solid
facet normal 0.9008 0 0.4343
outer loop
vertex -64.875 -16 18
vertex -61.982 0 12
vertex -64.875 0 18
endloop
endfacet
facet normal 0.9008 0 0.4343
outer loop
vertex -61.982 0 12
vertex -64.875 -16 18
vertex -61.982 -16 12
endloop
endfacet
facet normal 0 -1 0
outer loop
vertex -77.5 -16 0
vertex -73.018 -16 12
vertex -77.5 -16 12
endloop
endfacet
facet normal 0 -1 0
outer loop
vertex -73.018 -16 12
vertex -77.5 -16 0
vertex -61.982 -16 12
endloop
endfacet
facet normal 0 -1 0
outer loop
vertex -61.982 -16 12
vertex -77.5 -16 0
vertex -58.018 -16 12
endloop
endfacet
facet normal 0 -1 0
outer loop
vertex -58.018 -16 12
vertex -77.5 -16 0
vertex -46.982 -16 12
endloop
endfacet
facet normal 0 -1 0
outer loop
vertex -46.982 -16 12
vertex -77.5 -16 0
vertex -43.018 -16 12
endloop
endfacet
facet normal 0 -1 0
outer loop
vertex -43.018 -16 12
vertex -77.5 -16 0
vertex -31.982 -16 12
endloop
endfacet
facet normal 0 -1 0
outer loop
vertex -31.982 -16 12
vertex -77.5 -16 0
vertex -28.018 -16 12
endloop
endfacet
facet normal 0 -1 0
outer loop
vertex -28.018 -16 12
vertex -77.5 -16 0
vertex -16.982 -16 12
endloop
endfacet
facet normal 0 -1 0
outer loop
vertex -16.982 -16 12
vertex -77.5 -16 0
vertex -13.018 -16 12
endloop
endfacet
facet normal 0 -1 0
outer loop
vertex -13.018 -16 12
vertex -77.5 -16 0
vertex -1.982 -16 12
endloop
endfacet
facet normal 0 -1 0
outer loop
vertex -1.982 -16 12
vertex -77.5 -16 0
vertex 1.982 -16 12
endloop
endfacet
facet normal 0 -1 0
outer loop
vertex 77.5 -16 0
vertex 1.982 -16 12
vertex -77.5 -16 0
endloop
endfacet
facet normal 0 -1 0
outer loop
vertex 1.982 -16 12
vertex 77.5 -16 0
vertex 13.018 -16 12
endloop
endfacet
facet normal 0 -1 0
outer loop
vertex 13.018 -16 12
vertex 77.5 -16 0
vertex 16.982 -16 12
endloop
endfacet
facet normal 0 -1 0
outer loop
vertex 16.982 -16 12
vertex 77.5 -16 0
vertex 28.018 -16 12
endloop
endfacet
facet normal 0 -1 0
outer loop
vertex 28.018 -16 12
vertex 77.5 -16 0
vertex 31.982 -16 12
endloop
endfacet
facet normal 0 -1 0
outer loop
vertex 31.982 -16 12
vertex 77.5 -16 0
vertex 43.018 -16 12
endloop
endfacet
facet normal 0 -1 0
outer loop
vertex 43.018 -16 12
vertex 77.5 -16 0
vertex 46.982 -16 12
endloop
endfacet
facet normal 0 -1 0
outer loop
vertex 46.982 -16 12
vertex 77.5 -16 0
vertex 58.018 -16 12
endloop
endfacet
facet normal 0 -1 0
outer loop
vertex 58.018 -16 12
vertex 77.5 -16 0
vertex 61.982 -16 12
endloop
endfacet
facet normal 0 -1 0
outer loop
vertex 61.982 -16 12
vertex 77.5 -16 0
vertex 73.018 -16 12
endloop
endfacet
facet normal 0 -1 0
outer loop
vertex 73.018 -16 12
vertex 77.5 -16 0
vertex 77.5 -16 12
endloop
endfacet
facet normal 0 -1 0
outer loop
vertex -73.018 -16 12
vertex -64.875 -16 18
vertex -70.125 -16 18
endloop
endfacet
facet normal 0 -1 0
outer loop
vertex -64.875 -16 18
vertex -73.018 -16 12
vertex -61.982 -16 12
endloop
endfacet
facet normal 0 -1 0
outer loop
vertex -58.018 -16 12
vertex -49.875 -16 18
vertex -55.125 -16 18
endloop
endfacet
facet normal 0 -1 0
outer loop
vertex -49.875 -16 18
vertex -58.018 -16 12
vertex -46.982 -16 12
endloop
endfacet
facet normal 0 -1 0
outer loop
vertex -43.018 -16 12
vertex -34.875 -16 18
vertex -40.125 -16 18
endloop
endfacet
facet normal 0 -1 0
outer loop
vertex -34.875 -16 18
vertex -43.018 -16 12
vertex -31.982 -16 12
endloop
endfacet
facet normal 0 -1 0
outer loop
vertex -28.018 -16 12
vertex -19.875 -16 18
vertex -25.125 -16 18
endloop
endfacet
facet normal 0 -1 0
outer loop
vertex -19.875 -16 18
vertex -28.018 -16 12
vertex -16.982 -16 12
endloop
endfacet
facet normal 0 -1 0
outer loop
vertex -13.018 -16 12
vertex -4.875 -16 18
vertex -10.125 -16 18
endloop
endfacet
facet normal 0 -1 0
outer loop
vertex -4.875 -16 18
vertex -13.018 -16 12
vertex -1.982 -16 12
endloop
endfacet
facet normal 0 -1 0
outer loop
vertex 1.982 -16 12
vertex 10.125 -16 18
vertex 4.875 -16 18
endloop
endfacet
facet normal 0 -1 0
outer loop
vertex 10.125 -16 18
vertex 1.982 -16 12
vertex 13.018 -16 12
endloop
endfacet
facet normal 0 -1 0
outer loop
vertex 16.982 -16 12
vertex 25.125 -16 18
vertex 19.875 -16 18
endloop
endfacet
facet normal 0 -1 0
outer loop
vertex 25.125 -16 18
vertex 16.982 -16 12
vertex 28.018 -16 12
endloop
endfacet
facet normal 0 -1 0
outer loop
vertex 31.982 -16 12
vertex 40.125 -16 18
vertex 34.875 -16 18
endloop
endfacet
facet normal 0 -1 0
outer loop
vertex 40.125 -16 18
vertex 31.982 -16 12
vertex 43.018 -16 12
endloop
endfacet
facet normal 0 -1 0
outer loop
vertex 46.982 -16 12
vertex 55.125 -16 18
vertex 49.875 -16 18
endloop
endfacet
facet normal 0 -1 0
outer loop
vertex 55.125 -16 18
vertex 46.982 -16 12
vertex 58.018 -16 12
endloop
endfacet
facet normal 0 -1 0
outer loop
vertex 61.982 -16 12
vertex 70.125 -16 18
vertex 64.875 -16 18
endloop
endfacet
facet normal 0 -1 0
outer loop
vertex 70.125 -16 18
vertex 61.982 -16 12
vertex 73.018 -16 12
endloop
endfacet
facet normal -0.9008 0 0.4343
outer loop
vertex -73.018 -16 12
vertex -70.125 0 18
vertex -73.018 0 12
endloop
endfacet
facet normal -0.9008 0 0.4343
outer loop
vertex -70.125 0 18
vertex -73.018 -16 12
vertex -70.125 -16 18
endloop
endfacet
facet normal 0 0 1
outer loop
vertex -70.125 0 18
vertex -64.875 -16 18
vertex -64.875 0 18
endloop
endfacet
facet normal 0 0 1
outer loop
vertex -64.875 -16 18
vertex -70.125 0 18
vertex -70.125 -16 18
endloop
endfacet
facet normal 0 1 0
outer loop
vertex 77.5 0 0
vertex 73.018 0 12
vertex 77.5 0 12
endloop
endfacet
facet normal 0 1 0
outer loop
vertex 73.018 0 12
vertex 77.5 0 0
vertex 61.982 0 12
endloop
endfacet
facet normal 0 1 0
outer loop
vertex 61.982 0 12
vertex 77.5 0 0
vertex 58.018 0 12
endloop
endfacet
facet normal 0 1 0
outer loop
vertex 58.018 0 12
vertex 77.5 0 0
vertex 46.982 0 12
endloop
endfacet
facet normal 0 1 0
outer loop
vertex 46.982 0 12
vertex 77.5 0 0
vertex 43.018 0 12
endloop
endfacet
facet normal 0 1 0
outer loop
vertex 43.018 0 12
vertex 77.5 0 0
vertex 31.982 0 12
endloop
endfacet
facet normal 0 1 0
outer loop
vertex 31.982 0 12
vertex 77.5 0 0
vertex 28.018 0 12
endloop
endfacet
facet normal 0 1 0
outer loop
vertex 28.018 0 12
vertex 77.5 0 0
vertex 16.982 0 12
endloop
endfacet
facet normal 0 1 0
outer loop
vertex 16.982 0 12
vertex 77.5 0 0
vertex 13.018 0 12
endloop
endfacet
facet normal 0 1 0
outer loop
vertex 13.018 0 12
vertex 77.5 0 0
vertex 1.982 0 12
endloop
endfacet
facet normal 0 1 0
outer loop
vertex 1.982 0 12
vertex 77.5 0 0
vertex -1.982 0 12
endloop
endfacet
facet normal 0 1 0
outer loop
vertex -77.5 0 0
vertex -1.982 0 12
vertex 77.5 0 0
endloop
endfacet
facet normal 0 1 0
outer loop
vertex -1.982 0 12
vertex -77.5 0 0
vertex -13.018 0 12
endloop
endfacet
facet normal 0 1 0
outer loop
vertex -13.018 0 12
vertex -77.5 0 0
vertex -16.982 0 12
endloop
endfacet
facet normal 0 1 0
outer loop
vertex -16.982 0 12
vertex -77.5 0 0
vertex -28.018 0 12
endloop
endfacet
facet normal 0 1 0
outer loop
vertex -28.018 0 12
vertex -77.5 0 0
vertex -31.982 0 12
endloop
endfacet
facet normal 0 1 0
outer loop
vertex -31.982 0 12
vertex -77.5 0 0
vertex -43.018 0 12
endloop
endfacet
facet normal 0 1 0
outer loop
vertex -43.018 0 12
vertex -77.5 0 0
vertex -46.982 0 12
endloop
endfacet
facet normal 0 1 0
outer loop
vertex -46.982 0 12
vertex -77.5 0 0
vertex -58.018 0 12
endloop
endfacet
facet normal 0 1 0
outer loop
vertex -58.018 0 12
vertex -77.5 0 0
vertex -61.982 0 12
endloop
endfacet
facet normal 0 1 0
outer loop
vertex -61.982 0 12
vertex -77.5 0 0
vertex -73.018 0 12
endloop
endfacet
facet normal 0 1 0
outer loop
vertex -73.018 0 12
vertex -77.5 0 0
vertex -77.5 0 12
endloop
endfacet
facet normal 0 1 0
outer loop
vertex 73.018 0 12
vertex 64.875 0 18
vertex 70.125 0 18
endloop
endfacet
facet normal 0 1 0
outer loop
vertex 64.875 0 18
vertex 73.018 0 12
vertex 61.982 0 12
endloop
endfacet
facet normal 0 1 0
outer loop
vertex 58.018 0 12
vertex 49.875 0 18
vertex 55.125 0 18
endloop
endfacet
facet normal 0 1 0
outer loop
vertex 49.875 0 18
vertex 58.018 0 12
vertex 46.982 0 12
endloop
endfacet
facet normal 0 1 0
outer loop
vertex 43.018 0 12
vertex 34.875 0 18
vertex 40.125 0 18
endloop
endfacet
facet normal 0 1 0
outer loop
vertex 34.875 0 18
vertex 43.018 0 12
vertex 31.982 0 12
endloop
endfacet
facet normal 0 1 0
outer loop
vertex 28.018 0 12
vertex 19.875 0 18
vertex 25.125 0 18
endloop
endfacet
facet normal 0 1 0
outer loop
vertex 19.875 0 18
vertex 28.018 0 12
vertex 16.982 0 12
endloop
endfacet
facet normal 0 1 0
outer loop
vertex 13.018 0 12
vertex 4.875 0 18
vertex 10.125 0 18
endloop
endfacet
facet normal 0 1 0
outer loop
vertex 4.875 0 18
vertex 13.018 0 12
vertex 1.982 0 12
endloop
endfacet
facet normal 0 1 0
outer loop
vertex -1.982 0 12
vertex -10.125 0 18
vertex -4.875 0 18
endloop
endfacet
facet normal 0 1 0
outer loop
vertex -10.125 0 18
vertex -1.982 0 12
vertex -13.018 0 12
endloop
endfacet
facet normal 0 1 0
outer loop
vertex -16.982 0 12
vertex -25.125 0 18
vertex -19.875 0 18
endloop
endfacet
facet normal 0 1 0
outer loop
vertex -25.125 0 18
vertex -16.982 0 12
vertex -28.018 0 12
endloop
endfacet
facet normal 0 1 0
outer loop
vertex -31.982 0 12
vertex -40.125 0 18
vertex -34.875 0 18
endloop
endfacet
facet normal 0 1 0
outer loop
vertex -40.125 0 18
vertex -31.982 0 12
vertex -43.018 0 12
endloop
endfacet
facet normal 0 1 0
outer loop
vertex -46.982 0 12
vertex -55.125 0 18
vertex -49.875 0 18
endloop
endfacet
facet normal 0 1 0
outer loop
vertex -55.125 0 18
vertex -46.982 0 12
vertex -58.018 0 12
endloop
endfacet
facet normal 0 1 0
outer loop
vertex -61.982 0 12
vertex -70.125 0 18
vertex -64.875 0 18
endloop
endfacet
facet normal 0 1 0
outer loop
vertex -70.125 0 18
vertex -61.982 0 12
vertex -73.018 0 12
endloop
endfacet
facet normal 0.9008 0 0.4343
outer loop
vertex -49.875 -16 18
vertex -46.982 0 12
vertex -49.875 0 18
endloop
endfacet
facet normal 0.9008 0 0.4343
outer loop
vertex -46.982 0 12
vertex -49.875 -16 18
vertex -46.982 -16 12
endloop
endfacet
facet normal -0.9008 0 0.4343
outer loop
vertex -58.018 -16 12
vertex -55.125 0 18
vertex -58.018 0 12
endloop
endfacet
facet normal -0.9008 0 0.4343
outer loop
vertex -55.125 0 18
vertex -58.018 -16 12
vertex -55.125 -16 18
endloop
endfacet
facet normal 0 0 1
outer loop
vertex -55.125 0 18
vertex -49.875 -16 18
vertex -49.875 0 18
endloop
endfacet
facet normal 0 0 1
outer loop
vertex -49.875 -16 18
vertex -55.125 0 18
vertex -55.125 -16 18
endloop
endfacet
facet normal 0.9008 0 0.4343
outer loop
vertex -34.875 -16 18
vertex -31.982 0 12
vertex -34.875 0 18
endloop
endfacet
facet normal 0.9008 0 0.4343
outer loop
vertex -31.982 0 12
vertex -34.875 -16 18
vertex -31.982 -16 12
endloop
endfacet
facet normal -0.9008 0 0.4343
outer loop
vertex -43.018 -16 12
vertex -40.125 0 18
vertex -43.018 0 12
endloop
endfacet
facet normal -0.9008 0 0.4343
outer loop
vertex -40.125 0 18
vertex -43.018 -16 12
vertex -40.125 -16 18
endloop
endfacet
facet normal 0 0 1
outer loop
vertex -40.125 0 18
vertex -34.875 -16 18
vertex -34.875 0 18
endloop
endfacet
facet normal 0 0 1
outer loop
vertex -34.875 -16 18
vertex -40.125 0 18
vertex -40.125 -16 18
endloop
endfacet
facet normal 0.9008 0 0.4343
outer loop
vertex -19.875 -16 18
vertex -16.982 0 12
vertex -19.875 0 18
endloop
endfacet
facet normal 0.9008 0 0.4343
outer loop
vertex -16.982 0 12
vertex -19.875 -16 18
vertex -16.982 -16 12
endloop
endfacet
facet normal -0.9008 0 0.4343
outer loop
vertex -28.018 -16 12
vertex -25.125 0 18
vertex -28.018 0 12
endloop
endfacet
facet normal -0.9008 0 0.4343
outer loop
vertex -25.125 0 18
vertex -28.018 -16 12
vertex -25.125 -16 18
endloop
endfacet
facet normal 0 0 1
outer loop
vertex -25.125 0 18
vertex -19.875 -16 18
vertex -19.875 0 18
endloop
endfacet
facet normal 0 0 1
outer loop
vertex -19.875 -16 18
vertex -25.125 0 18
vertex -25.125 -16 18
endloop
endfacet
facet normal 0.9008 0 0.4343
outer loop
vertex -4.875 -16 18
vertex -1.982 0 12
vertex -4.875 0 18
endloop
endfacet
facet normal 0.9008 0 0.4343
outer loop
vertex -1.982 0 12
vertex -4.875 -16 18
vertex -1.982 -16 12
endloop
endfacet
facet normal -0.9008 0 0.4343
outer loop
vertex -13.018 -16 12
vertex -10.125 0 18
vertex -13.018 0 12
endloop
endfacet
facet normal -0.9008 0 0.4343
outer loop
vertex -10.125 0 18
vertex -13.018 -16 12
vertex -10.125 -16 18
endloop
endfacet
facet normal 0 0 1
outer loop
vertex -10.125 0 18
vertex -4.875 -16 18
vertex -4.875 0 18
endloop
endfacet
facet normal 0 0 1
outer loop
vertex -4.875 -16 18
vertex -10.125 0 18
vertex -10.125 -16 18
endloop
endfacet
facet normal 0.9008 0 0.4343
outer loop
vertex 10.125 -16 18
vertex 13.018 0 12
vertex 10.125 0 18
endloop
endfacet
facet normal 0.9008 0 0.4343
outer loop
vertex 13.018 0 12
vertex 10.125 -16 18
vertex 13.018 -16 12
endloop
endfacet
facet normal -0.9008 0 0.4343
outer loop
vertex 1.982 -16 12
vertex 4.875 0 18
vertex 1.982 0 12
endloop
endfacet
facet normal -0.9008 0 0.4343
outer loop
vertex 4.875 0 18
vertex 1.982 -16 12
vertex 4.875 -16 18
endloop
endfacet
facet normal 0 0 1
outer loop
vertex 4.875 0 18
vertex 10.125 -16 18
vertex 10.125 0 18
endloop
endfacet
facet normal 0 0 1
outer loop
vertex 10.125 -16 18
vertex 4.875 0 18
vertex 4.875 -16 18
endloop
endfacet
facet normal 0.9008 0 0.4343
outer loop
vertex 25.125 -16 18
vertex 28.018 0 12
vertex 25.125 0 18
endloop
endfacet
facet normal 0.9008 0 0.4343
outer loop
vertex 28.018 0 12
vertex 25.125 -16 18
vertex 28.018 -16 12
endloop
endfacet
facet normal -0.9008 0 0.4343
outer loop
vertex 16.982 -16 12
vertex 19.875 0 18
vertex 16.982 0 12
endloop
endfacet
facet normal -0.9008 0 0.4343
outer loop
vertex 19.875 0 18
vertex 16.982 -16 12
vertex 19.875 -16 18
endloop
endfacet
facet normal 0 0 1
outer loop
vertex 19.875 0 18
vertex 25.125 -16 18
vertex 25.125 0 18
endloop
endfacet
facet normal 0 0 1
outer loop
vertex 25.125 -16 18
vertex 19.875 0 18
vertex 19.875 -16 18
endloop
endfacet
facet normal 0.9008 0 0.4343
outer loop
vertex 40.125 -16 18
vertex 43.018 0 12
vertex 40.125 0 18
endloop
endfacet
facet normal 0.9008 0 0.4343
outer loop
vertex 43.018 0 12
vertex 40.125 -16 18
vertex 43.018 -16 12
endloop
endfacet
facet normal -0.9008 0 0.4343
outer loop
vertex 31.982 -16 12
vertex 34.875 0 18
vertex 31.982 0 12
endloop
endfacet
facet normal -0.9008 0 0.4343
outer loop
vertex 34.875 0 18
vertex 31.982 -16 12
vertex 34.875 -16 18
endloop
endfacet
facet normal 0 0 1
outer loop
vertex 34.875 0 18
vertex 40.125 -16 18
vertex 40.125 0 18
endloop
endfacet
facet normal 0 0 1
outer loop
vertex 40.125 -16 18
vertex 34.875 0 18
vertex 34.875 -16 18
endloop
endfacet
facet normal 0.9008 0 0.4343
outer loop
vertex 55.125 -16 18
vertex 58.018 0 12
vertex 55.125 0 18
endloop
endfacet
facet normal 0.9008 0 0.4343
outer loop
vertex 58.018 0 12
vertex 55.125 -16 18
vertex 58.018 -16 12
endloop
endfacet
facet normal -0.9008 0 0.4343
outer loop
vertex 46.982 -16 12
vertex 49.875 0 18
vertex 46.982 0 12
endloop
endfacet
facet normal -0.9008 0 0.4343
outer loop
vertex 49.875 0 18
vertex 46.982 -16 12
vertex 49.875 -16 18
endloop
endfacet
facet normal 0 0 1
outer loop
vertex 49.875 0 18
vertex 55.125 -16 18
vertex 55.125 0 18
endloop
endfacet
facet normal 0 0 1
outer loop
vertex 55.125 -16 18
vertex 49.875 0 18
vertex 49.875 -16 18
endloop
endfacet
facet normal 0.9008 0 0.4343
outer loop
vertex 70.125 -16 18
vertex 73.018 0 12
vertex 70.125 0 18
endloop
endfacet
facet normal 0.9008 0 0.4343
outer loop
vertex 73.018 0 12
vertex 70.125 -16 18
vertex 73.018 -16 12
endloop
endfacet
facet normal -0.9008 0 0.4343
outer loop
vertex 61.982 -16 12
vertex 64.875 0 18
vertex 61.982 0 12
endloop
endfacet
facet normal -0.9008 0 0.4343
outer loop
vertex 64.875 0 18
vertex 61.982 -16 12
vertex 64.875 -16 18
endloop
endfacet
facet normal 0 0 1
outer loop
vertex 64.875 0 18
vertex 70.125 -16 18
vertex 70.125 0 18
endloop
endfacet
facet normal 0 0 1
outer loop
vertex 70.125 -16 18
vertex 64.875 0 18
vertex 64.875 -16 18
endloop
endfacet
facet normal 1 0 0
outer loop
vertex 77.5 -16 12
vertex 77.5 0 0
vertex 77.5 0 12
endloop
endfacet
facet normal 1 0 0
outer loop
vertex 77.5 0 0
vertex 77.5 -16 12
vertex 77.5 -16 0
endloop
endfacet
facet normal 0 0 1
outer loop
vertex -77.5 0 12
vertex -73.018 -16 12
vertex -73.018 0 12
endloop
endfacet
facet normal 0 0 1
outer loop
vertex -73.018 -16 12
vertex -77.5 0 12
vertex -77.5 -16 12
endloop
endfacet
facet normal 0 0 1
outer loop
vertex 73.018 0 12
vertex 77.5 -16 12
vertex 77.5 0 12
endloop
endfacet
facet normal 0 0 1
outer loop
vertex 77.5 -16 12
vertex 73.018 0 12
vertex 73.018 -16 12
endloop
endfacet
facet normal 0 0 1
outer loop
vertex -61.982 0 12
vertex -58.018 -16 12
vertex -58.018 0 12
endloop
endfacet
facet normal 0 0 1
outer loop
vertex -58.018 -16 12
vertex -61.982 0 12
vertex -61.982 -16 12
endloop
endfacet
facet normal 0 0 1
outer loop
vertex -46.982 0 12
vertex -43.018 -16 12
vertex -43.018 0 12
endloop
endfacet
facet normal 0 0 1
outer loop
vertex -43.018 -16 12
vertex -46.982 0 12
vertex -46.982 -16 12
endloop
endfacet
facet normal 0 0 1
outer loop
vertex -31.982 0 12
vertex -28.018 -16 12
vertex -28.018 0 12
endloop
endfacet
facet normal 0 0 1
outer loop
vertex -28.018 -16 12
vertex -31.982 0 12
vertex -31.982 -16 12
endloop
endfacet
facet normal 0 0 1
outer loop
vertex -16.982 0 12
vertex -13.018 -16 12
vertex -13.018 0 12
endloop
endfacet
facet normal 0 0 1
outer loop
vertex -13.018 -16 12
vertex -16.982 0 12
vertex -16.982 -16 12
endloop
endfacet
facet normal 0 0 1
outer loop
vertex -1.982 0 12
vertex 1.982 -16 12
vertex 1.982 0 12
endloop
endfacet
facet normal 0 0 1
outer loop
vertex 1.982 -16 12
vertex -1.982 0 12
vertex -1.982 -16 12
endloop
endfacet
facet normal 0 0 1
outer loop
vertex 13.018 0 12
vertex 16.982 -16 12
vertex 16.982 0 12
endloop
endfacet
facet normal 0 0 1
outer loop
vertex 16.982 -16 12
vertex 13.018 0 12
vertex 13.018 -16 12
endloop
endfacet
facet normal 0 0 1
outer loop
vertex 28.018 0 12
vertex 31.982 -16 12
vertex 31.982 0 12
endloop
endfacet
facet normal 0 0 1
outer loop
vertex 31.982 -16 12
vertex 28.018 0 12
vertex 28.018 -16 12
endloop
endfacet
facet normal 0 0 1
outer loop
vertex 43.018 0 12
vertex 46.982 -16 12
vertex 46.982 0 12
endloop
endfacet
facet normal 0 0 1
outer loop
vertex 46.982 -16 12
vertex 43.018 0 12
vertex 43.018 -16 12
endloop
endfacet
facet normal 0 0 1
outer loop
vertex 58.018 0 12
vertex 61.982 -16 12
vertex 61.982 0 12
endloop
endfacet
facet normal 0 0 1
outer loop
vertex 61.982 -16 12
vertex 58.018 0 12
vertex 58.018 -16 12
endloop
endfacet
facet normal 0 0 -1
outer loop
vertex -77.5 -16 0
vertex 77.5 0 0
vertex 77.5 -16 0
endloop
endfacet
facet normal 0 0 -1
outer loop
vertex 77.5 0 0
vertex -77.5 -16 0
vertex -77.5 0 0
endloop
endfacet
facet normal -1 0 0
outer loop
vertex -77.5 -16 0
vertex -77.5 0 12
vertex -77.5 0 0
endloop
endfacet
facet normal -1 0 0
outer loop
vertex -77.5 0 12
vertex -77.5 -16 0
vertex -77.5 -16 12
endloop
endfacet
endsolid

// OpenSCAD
$fn = 32;

// ----------------------------------------------------------------------
// Toothed rack, 10 teeth
// 15 mm pitch, 6 mm teeth
// ----------------------------------------------------------------------

// --- parameters (mm) ---
bar_w = 16;      // bar width (Y)
bar_h = 12;      // bar height (Z)
teeth = 10;      // number of teeth
pitch = 15;      // tooth pitch
tooth_h = 6;     // tooth height above the bar
root_w = 12;     // tooth width at the root
crest_w = 5.25;  // tooth width at the crest

// --- derived feature positions (mm) ---
span = (teeth - 1) * pitch;  // = 135   distance between the outer teeth
bar_l = span + root_w + 8;   // = 155   bar length: teeth plus 4 mm at each end
tooth_x = -span / 2;         // = -67.5   X of the first tooth
height = bar_h + tooth_h;    // = 18   overall height
feature_centers = [
  [tooth_x + 0 * pitch, -bar_w / 2],
  [tooth_x + 1 * pitch, -bar_w / 2],
  [tooth_x + 2 * pitch, -bar_w / 2],
  [tooth_x + 3 * pitch, -bar_w / 2],
  [tooth_x + 4 * pitch, -bar_w / 2],
  [tooth_x + 5 * pitch, -bar_w / 2],
  [tooth_x + 6 * pitch, -bar_w / 2],
  [tooth_x + 7 * pitch, -bar_w / 2],
  [tooth_x + 8 * pitch, -bar_w / 2],
  [tooth_x + 9 * pitch, -bar_w / 2]
];   // tooth centre line, drives the tooth loop

// bar with a rack of teeth, one extruded trapezoium per centre
module rack_tooth() {
  linear_extrude(height = bar_w)
    polygon(points = [
      [0, 0],
      [root_w, 0],
      [root_w / 2 + crest_w / 2, tooth_h + 1],
      [root_w / 2 - crest_w / 2, tooth_h + 1]
    ]);
}

union() {
  translate([-bar_l / 2, -bar_w, 0]) cube([bar_l, bar_w, bar_h]);
  for (centre = feature_centers)
    translate([centre[0] - root_w / 2, 0, bar_h - 1]) rotate([90, 0, 0]) rack_tooth();
}
